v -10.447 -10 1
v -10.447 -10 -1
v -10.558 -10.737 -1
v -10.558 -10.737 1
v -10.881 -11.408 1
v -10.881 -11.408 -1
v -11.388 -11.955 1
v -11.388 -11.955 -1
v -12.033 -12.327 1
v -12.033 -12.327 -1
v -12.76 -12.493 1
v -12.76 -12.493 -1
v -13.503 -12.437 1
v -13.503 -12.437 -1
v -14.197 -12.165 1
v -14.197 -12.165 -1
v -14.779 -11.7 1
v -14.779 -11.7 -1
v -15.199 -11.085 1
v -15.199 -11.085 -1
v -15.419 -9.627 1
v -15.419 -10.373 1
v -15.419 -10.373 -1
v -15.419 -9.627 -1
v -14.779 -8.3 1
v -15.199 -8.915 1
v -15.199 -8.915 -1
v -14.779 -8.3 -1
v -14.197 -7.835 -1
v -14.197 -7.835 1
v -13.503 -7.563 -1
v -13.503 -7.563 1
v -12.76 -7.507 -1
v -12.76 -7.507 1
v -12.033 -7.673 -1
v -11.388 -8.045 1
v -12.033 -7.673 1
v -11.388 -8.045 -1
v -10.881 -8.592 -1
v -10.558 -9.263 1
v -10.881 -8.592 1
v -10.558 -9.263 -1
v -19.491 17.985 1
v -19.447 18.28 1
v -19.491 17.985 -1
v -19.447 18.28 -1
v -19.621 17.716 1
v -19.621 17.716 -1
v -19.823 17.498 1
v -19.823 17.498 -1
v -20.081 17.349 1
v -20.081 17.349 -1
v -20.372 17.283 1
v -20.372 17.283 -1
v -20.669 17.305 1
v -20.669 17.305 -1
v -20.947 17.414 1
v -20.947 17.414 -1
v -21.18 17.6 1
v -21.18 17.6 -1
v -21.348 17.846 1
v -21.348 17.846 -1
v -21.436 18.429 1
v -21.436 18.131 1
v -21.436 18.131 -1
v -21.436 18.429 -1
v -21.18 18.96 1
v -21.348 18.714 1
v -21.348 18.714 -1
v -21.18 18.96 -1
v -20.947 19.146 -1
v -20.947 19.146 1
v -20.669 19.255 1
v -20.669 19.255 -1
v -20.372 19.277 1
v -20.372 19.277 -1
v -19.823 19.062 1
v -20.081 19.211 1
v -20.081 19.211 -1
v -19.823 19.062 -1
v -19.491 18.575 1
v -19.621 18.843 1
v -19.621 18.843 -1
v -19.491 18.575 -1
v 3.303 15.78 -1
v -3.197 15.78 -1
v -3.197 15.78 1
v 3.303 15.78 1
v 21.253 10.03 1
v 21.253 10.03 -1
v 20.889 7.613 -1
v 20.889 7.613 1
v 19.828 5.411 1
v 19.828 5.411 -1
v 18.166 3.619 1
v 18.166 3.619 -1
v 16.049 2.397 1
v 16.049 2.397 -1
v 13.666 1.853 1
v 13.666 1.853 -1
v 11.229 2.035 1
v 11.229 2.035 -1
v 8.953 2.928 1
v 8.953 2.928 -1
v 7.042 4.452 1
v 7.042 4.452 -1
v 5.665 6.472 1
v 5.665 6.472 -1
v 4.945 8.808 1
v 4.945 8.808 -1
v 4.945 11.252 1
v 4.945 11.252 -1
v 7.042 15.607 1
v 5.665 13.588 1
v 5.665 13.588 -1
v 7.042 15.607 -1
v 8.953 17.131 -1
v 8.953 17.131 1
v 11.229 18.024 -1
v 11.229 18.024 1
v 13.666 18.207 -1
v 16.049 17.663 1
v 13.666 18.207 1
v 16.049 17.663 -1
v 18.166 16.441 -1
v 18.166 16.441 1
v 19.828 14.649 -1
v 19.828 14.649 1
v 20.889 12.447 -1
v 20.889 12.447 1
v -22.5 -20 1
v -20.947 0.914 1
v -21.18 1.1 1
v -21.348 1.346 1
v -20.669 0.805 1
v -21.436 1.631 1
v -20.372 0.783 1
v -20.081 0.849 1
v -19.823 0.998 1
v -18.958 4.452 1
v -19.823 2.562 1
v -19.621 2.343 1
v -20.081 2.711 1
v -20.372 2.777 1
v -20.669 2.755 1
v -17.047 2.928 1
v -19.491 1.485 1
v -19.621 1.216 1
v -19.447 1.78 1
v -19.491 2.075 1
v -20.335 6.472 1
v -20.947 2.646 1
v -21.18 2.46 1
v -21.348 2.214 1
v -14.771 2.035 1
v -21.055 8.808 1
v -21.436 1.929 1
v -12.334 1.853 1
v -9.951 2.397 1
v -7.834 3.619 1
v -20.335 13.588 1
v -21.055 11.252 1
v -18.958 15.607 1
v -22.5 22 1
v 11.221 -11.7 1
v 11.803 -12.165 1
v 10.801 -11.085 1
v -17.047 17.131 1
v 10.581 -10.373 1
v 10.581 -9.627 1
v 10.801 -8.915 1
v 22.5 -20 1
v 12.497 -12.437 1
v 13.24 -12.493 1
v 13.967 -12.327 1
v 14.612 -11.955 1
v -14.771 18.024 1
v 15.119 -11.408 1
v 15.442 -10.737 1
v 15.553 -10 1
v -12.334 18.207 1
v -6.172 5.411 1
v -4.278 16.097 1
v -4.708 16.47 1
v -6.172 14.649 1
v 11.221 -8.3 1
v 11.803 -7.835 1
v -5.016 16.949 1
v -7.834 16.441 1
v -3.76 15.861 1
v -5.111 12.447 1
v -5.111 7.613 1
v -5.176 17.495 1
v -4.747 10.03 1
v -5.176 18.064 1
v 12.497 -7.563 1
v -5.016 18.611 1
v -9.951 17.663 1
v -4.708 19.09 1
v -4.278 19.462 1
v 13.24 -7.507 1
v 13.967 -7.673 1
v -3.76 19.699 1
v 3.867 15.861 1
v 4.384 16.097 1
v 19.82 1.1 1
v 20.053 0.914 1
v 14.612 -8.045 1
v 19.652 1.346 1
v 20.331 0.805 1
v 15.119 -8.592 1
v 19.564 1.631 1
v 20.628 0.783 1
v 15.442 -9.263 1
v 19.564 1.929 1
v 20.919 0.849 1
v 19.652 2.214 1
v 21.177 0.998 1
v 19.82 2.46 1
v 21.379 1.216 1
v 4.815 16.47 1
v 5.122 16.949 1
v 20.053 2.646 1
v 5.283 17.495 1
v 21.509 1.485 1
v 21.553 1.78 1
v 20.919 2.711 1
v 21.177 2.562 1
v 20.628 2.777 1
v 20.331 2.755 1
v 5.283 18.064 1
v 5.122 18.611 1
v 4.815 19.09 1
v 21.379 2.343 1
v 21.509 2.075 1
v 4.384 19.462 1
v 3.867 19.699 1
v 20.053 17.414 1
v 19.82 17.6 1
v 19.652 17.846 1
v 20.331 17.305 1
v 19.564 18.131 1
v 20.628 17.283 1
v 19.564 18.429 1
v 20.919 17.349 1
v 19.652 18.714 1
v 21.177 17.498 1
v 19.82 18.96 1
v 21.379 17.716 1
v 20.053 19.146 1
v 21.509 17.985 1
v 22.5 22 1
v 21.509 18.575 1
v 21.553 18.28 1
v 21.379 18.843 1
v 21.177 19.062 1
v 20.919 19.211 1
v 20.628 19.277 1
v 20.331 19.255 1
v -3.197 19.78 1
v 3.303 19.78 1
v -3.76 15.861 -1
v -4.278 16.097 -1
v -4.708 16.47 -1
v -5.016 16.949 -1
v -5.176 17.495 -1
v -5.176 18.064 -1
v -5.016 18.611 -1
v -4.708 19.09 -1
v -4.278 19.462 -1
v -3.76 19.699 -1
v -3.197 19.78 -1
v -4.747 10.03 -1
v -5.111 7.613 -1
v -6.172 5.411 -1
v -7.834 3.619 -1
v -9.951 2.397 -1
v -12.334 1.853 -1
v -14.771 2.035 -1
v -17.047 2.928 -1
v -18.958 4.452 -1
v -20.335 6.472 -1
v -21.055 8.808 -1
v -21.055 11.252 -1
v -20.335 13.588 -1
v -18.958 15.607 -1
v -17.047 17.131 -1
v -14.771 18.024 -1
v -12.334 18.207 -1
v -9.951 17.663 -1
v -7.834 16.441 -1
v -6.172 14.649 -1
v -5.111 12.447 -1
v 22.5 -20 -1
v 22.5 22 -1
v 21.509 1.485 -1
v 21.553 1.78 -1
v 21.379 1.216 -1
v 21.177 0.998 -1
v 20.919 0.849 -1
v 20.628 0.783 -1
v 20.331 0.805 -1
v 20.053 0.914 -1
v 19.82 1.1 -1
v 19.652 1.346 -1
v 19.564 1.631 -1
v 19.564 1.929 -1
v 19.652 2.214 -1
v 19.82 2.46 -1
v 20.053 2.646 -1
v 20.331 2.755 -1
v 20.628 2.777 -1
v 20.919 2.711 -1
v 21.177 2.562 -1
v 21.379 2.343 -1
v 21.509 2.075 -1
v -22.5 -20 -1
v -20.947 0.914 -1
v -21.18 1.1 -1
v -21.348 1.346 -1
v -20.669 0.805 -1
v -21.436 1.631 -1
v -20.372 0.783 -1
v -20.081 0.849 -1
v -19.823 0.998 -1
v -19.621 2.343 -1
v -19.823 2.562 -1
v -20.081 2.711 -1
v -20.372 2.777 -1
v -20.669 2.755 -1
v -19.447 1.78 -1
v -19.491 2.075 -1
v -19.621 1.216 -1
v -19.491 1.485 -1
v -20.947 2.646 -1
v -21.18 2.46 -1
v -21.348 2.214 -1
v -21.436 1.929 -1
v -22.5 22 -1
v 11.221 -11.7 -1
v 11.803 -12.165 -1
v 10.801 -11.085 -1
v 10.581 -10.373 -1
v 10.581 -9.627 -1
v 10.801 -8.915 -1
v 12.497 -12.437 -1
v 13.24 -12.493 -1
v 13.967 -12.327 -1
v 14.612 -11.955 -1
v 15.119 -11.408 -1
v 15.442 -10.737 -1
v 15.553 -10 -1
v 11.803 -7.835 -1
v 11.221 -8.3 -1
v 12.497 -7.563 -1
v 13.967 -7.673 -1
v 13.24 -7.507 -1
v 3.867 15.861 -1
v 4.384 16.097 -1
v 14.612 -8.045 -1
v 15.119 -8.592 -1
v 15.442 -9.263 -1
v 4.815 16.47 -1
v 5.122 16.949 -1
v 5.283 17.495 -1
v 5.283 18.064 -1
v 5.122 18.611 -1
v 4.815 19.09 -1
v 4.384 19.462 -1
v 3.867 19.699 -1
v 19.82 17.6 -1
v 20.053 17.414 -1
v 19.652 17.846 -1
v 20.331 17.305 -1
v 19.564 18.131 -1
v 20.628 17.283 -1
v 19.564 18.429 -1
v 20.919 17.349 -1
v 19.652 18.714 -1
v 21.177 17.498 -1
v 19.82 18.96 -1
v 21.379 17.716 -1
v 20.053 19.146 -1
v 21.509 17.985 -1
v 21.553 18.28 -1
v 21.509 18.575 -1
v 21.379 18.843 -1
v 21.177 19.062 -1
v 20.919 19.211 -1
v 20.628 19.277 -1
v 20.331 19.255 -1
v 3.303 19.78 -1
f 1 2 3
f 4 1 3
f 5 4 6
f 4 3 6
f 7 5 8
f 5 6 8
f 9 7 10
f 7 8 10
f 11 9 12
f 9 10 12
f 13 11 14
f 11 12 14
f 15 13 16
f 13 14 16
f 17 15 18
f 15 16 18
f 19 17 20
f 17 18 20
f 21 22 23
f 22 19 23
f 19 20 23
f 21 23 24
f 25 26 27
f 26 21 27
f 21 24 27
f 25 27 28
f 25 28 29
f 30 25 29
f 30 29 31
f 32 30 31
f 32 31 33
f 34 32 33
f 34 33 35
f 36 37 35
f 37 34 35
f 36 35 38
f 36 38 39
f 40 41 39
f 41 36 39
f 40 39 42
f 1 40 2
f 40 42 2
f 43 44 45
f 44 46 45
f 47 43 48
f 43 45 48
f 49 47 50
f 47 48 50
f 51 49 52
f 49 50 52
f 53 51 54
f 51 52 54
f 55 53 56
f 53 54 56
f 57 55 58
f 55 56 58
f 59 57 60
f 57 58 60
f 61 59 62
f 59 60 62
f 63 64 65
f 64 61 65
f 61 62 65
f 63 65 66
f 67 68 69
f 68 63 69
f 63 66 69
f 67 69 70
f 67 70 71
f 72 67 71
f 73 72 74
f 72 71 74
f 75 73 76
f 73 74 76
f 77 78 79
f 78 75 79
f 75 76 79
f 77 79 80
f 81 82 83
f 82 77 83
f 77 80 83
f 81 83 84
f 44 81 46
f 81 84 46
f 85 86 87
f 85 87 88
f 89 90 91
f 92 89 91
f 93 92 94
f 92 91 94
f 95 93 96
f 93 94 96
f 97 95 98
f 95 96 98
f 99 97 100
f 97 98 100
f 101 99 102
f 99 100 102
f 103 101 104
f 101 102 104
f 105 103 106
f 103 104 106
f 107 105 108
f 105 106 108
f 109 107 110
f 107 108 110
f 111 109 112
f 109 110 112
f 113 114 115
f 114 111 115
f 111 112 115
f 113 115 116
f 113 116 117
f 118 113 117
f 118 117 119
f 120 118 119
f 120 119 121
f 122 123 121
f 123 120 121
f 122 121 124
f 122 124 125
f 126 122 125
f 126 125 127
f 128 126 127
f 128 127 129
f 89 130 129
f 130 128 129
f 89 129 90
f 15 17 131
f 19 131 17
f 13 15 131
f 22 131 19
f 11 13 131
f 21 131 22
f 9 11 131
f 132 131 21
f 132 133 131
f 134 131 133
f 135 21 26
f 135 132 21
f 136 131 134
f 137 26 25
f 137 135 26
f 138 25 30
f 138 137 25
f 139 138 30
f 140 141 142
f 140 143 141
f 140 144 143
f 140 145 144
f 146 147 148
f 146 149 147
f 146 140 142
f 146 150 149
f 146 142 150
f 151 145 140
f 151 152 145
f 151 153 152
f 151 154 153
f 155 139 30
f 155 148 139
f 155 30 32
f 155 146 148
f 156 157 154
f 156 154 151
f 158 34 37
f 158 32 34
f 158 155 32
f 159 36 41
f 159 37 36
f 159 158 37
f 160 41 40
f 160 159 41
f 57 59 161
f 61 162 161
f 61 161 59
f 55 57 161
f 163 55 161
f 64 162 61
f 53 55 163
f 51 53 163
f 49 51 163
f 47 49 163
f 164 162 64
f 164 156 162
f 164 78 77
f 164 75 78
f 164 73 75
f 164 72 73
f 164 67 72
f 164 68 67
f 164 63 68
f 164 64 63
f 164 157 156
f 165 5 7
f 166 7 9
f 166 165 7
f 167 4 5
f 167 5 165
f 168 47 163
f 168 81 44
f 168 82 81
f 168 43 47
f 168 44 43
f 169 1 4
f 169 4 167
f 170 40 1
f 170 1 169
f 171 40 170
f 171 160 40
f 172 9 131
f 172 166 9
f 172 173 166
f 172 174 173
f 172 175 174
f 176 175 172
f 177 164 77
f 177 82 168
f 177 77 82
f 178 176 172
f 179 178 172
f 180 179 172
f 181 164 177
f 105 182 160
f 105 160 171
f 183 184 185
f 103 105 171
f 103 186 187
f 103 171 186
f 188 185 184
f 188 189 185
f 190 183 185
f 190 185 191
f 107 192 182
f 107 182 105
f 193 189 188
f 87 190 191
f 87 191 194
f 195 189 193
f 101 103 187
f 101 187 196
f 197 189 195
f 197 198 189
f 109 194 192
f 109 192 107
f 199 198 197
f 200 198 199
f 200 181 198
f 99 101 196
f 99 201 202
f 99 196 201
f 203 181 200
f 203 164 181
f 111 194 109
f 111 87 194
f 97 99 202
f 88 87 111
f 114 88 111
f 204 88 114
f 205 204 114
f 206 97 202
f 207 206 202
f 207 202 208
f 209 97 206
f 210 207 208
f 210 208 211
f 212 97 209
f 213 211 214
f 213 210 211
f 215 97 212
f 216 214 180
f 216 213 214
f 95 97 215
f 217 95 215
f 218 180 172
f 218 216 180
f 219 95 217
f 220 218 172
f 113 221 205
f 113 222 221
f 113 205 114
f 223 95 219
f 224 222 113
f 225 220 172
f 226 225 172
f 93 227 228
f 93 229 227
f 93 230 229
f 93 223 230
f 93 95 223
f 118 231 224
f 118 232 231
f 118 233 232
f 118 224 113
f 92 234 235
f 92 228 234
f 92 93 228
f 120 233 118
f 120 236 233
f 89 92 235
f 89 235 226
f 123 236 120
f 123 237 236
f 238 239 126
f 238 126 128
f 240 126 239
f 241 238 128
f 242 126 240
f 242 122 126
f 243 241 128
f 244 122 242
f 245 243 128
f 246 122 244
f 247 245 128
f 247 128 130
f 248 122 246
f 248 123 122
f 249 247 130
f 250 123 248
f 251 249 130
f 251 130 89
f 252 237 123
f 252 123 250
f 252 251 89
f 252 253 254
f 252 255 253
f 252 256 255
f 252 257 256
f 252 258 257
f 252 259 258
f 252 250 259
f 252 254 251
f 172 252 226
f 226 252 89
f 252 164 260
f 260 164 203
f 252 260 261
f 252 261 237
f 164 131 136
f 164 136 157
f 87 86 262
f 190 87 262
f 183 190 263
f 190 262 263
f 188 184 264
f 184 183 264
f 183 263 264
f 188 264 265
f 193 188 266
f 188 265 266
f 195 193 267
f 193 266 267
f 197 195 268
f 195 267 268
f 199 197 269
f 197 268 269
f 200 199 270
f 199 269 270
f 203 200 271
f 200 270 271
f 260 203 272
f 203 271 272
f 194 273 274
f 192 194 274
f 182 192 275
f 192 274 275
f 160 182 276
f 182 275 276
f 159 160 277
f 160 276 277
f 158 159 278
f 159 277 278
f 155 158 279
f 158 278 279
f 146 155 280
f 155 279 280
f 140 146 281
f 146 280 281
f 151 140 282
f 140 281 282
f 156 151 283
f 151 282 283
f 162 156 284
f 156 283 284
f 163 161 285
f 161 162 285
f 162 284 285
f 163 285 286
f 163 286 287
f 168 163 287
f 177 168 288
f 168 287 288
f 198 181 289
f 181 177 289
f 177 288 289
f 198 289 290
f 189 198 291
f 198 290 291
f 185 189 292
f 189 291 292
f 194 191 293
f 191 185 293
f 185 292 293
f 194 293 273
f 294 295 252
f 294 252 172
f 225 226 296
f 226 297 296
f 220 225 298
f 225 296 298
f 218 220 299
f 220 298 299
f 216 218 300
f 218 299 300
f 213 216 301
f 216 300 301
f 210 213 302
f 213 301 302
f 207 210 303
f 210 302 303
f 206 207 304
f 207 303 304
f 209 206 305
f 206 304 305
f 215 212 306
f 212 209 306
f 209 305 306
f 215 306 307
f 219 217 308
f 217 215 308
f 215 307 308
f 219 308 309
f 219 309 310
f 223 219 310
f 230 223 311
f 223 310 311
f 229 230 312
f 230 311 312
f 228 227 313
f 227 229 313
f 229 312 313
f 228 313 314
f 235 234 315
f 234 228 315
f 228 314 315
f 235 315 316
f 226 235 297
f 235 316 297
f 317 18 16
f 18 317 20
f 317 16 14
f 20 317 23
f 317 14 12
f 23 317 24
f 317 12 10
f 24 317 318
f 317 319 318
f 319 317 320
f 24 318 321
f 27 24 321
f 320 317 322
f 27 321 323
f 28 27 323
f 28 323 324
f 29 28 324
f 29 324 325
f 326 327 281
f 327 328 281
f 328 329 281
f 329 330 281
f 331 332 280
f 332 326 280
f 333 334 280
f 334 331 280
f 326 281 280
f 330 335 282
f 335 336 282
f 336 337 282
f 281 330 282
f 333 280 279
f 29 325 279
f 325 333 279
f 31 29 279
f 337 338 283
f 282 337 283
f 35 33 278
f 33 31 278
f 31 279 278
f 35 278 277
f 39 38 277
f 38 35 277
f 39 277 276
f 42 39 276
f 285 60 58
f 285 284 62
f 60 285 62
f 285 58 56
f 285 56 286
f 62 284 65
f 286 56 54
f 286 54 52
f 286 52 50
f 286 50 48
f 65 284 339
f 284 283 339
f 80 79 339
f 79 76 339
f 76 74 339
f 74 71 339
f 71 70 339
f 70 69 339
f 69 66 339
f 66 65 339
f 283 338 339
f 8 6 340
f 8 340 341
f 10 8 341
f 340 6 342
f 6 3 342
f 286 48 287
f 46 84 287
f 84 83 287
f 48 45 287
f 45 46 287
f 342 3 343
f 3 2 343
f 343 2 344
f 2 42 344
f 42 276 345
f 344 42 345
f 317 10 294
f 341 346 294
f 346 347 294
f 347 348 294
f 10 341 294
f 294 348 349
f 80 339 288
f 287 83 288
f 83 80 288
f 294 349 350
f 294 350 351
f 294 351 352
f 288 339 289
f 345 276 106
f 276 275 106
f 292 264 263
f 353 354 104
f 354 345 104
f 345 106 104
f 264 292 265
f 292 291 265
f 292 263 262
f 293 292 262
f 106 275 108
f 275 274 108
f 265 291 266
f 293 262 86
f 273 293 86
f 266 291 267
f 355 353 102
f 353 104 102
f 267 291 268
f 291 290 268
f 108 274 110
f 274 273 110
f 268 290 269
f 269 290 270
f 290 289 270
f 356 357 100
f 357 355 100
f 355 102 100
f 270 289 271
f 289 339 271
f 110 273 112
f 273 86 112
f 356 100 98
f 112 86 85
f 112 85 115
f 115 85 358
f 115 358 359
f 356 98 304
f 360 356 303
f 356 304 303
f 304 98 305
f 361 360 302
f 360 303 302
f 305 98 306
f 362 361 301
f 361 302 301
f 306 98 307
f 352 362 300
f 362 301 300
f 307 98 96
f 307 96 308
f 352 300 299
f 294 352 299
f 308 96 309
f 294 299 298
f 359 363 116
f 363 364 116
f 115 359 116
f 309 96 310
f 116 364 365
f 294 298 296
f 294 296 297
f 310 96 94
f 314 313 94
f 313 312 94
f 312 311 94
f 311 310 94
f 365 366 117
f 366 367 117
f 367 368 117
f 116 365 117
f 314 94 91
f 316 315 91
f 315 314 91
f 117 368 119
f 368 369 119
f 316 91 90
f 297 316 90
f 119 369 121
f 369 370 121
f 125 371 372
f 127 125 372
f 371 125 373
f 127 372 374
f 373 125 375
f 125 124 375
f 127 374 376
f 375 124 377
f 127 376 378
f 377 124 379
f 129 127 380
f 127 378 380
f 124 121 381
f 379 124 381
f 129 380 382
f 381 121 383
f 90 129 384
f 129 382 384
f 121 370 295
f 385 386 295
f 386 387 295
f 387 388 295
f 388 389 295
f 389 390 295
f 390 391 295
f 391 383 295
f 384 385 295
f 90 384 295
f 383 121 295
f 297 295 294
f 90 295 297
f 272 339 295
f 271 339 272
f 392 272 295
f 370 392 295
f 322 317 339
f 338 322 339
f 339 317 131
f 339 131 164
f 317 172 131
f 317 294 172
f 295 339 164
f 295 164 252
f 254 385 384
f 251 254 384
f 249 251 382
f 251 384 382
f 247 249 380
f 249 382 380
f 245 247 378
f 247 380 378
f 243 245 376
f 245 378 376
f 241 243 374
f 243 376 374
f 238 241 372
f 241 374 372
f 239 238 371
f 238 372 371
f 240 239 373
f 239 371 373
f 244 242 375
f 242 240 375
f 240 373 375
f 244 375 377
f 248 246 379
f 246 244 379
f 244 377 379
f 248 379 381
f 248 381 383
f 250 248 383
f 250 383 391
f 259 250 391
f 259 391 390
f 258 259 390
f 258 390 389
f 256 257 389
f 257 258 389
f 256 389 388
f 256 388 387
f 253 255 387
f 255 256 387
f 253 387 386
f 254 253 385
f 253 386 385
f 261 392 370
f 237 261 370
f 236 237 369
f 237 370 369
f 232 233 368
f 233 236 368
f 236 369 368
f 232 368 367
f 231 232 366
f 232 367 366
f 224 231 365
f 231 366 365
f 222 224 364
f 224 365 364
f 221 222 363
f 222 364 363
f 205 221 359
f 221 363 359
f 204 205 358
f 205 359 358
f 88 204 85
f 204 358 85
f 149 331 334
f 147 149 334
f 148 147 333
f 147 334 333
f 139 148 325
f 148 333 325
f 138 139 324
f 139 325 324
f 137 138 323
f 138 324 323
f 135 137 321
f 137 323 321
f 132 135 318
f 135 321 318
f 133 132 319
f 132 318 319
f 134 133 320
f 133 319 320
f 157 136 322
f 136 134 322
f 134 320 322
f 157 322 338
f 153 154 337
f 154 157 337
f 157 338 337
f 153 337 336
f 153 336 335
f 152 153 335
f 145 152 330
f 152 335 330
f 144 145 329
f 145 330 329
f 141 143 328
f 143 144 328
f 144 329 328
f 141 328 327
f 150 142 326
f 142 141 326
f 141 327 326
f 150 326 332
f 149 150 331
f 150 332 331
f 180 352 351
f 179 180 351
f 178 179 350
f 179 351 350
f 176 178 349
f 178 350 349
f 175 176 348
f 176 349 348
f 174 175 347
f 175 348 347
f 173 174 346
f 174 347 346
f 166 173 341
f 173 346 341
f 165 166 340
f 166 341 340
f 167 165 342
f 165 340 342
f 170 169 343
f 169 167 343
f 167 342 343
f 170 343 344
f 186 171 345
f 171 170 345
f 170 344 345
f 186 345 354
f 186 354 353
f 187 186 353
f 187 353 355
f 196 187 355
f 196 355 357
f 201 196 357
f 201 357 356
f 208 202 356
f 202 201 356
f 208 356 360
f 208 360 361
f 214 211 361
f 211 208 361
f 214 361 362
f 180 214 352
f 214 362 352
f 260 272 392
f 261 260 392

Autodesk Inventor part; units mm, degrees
sketch "Sketch1" plane through (0, 0, 0) normal (0, 0, 1) x (1, 0, 0)
  line L0 (-22.5, 20) -> (22.5, 20)
  line L1 (22.5, 20) -> (22.5, 0)
  line L2 (22.5, 0) -> (-22.5, 0)
  line L3 (-22.5, 0) -> (-22.5, 20)
  line L4 (-22.5, 20) -> (22.5, 0) construction
  line L5 (22.5, 20) -> (-22.5, 0) construction
  circle A0 centre (-20.4468, 18.2798) radius 1
  circle A1 centre (20.5532, 18.2798) radius 1
  circle A2 centre (20.5532, 1.7798) radius 1
  circle A3 centre (-20.4468, 1.7798) radius 1
  circle A4 centre (-12.9468, 10.0298) radius 8.2
  circle A5 centre (13.0532, 10.0298) radius 8.2
  line L6 (-3.1968, 19.7798) -> (3.3032, 19.7798)
  line L7 (-3.1968, 15.7798) -> (3.3032, 15.7798)
  arc A6 (-3.1968, 19.7798) -> (-3.1968, 15.7798) centre (-3.1968, 17.7798) ccw
  arc A7 (3.3032, 15.7798) -> (3.3032, 19.7798) centre (3.3032, 17.7798) ccw
  line L8 (-22.5, 0) -> (22.5, 0)
  line L9 (22.5, 0) -> (22.5, -20)
  line L10 (22.5, -20) -> (-22.5, -20)
  line L11 (-22.5, -20) -> (-22.5, 0)
  line L12 (-22.5, 0) -> (22.5, -20) construction
  line L13 (22.5, 0) -> (-22.5, -20) construction
  circle A8 centre (13.0532, -10) radius 2.5
  circle A9 centre (-12.9468, -10) radius 2.5
  circle A10 centre (-20.4468, 18.2798) radius 1 projected
  circle A11 centre (-20.4468, 1.7798) radius 1 projected
  circle A12 centre (20.5532, 18.2798) radius 1 projected
  circle A13 centre (20.5532, 1.7798) radius 1 projected
  line L14 (-22.5, 22) -> (22.5, 22)
  line L15 (22.5, 22) -> (22.5, 20)
  line L16 (22.5, 20) -> (-22.5, 20)
  line L17 (-22.5, 20) -> (-22.5, 22)
  point P0 (0, 0)
  point P1 (0, 10)
  point P2 (-5.1968, 17.7798)
  point P3 (0, 0)
  point P4 (5.3032, 17.7798)
  point P5 (0, -10)
  point P6 (-22.5, 0)
  point P7 (0, 20)
  dimension "d0" = 45
  dimension "d1" = 20
  dimension "d16" = 16.4
  dimension "d18" = 12.9468
  dimension "d19" = 9.9702
  dimension "d20" = 9.9702
  dimension "d21" = 13.0532
  dimension "d23" = 10.5
  dimension "d24" = 2
  dimension "d25" = 5
  dimension "d26" = 20
  dimension "d27" = 2
extrude "Extrusion2" add sketch "Sketch1" along normal mid plane 2
properties part number "suporte_ultrassonico_001_3DPrint"
